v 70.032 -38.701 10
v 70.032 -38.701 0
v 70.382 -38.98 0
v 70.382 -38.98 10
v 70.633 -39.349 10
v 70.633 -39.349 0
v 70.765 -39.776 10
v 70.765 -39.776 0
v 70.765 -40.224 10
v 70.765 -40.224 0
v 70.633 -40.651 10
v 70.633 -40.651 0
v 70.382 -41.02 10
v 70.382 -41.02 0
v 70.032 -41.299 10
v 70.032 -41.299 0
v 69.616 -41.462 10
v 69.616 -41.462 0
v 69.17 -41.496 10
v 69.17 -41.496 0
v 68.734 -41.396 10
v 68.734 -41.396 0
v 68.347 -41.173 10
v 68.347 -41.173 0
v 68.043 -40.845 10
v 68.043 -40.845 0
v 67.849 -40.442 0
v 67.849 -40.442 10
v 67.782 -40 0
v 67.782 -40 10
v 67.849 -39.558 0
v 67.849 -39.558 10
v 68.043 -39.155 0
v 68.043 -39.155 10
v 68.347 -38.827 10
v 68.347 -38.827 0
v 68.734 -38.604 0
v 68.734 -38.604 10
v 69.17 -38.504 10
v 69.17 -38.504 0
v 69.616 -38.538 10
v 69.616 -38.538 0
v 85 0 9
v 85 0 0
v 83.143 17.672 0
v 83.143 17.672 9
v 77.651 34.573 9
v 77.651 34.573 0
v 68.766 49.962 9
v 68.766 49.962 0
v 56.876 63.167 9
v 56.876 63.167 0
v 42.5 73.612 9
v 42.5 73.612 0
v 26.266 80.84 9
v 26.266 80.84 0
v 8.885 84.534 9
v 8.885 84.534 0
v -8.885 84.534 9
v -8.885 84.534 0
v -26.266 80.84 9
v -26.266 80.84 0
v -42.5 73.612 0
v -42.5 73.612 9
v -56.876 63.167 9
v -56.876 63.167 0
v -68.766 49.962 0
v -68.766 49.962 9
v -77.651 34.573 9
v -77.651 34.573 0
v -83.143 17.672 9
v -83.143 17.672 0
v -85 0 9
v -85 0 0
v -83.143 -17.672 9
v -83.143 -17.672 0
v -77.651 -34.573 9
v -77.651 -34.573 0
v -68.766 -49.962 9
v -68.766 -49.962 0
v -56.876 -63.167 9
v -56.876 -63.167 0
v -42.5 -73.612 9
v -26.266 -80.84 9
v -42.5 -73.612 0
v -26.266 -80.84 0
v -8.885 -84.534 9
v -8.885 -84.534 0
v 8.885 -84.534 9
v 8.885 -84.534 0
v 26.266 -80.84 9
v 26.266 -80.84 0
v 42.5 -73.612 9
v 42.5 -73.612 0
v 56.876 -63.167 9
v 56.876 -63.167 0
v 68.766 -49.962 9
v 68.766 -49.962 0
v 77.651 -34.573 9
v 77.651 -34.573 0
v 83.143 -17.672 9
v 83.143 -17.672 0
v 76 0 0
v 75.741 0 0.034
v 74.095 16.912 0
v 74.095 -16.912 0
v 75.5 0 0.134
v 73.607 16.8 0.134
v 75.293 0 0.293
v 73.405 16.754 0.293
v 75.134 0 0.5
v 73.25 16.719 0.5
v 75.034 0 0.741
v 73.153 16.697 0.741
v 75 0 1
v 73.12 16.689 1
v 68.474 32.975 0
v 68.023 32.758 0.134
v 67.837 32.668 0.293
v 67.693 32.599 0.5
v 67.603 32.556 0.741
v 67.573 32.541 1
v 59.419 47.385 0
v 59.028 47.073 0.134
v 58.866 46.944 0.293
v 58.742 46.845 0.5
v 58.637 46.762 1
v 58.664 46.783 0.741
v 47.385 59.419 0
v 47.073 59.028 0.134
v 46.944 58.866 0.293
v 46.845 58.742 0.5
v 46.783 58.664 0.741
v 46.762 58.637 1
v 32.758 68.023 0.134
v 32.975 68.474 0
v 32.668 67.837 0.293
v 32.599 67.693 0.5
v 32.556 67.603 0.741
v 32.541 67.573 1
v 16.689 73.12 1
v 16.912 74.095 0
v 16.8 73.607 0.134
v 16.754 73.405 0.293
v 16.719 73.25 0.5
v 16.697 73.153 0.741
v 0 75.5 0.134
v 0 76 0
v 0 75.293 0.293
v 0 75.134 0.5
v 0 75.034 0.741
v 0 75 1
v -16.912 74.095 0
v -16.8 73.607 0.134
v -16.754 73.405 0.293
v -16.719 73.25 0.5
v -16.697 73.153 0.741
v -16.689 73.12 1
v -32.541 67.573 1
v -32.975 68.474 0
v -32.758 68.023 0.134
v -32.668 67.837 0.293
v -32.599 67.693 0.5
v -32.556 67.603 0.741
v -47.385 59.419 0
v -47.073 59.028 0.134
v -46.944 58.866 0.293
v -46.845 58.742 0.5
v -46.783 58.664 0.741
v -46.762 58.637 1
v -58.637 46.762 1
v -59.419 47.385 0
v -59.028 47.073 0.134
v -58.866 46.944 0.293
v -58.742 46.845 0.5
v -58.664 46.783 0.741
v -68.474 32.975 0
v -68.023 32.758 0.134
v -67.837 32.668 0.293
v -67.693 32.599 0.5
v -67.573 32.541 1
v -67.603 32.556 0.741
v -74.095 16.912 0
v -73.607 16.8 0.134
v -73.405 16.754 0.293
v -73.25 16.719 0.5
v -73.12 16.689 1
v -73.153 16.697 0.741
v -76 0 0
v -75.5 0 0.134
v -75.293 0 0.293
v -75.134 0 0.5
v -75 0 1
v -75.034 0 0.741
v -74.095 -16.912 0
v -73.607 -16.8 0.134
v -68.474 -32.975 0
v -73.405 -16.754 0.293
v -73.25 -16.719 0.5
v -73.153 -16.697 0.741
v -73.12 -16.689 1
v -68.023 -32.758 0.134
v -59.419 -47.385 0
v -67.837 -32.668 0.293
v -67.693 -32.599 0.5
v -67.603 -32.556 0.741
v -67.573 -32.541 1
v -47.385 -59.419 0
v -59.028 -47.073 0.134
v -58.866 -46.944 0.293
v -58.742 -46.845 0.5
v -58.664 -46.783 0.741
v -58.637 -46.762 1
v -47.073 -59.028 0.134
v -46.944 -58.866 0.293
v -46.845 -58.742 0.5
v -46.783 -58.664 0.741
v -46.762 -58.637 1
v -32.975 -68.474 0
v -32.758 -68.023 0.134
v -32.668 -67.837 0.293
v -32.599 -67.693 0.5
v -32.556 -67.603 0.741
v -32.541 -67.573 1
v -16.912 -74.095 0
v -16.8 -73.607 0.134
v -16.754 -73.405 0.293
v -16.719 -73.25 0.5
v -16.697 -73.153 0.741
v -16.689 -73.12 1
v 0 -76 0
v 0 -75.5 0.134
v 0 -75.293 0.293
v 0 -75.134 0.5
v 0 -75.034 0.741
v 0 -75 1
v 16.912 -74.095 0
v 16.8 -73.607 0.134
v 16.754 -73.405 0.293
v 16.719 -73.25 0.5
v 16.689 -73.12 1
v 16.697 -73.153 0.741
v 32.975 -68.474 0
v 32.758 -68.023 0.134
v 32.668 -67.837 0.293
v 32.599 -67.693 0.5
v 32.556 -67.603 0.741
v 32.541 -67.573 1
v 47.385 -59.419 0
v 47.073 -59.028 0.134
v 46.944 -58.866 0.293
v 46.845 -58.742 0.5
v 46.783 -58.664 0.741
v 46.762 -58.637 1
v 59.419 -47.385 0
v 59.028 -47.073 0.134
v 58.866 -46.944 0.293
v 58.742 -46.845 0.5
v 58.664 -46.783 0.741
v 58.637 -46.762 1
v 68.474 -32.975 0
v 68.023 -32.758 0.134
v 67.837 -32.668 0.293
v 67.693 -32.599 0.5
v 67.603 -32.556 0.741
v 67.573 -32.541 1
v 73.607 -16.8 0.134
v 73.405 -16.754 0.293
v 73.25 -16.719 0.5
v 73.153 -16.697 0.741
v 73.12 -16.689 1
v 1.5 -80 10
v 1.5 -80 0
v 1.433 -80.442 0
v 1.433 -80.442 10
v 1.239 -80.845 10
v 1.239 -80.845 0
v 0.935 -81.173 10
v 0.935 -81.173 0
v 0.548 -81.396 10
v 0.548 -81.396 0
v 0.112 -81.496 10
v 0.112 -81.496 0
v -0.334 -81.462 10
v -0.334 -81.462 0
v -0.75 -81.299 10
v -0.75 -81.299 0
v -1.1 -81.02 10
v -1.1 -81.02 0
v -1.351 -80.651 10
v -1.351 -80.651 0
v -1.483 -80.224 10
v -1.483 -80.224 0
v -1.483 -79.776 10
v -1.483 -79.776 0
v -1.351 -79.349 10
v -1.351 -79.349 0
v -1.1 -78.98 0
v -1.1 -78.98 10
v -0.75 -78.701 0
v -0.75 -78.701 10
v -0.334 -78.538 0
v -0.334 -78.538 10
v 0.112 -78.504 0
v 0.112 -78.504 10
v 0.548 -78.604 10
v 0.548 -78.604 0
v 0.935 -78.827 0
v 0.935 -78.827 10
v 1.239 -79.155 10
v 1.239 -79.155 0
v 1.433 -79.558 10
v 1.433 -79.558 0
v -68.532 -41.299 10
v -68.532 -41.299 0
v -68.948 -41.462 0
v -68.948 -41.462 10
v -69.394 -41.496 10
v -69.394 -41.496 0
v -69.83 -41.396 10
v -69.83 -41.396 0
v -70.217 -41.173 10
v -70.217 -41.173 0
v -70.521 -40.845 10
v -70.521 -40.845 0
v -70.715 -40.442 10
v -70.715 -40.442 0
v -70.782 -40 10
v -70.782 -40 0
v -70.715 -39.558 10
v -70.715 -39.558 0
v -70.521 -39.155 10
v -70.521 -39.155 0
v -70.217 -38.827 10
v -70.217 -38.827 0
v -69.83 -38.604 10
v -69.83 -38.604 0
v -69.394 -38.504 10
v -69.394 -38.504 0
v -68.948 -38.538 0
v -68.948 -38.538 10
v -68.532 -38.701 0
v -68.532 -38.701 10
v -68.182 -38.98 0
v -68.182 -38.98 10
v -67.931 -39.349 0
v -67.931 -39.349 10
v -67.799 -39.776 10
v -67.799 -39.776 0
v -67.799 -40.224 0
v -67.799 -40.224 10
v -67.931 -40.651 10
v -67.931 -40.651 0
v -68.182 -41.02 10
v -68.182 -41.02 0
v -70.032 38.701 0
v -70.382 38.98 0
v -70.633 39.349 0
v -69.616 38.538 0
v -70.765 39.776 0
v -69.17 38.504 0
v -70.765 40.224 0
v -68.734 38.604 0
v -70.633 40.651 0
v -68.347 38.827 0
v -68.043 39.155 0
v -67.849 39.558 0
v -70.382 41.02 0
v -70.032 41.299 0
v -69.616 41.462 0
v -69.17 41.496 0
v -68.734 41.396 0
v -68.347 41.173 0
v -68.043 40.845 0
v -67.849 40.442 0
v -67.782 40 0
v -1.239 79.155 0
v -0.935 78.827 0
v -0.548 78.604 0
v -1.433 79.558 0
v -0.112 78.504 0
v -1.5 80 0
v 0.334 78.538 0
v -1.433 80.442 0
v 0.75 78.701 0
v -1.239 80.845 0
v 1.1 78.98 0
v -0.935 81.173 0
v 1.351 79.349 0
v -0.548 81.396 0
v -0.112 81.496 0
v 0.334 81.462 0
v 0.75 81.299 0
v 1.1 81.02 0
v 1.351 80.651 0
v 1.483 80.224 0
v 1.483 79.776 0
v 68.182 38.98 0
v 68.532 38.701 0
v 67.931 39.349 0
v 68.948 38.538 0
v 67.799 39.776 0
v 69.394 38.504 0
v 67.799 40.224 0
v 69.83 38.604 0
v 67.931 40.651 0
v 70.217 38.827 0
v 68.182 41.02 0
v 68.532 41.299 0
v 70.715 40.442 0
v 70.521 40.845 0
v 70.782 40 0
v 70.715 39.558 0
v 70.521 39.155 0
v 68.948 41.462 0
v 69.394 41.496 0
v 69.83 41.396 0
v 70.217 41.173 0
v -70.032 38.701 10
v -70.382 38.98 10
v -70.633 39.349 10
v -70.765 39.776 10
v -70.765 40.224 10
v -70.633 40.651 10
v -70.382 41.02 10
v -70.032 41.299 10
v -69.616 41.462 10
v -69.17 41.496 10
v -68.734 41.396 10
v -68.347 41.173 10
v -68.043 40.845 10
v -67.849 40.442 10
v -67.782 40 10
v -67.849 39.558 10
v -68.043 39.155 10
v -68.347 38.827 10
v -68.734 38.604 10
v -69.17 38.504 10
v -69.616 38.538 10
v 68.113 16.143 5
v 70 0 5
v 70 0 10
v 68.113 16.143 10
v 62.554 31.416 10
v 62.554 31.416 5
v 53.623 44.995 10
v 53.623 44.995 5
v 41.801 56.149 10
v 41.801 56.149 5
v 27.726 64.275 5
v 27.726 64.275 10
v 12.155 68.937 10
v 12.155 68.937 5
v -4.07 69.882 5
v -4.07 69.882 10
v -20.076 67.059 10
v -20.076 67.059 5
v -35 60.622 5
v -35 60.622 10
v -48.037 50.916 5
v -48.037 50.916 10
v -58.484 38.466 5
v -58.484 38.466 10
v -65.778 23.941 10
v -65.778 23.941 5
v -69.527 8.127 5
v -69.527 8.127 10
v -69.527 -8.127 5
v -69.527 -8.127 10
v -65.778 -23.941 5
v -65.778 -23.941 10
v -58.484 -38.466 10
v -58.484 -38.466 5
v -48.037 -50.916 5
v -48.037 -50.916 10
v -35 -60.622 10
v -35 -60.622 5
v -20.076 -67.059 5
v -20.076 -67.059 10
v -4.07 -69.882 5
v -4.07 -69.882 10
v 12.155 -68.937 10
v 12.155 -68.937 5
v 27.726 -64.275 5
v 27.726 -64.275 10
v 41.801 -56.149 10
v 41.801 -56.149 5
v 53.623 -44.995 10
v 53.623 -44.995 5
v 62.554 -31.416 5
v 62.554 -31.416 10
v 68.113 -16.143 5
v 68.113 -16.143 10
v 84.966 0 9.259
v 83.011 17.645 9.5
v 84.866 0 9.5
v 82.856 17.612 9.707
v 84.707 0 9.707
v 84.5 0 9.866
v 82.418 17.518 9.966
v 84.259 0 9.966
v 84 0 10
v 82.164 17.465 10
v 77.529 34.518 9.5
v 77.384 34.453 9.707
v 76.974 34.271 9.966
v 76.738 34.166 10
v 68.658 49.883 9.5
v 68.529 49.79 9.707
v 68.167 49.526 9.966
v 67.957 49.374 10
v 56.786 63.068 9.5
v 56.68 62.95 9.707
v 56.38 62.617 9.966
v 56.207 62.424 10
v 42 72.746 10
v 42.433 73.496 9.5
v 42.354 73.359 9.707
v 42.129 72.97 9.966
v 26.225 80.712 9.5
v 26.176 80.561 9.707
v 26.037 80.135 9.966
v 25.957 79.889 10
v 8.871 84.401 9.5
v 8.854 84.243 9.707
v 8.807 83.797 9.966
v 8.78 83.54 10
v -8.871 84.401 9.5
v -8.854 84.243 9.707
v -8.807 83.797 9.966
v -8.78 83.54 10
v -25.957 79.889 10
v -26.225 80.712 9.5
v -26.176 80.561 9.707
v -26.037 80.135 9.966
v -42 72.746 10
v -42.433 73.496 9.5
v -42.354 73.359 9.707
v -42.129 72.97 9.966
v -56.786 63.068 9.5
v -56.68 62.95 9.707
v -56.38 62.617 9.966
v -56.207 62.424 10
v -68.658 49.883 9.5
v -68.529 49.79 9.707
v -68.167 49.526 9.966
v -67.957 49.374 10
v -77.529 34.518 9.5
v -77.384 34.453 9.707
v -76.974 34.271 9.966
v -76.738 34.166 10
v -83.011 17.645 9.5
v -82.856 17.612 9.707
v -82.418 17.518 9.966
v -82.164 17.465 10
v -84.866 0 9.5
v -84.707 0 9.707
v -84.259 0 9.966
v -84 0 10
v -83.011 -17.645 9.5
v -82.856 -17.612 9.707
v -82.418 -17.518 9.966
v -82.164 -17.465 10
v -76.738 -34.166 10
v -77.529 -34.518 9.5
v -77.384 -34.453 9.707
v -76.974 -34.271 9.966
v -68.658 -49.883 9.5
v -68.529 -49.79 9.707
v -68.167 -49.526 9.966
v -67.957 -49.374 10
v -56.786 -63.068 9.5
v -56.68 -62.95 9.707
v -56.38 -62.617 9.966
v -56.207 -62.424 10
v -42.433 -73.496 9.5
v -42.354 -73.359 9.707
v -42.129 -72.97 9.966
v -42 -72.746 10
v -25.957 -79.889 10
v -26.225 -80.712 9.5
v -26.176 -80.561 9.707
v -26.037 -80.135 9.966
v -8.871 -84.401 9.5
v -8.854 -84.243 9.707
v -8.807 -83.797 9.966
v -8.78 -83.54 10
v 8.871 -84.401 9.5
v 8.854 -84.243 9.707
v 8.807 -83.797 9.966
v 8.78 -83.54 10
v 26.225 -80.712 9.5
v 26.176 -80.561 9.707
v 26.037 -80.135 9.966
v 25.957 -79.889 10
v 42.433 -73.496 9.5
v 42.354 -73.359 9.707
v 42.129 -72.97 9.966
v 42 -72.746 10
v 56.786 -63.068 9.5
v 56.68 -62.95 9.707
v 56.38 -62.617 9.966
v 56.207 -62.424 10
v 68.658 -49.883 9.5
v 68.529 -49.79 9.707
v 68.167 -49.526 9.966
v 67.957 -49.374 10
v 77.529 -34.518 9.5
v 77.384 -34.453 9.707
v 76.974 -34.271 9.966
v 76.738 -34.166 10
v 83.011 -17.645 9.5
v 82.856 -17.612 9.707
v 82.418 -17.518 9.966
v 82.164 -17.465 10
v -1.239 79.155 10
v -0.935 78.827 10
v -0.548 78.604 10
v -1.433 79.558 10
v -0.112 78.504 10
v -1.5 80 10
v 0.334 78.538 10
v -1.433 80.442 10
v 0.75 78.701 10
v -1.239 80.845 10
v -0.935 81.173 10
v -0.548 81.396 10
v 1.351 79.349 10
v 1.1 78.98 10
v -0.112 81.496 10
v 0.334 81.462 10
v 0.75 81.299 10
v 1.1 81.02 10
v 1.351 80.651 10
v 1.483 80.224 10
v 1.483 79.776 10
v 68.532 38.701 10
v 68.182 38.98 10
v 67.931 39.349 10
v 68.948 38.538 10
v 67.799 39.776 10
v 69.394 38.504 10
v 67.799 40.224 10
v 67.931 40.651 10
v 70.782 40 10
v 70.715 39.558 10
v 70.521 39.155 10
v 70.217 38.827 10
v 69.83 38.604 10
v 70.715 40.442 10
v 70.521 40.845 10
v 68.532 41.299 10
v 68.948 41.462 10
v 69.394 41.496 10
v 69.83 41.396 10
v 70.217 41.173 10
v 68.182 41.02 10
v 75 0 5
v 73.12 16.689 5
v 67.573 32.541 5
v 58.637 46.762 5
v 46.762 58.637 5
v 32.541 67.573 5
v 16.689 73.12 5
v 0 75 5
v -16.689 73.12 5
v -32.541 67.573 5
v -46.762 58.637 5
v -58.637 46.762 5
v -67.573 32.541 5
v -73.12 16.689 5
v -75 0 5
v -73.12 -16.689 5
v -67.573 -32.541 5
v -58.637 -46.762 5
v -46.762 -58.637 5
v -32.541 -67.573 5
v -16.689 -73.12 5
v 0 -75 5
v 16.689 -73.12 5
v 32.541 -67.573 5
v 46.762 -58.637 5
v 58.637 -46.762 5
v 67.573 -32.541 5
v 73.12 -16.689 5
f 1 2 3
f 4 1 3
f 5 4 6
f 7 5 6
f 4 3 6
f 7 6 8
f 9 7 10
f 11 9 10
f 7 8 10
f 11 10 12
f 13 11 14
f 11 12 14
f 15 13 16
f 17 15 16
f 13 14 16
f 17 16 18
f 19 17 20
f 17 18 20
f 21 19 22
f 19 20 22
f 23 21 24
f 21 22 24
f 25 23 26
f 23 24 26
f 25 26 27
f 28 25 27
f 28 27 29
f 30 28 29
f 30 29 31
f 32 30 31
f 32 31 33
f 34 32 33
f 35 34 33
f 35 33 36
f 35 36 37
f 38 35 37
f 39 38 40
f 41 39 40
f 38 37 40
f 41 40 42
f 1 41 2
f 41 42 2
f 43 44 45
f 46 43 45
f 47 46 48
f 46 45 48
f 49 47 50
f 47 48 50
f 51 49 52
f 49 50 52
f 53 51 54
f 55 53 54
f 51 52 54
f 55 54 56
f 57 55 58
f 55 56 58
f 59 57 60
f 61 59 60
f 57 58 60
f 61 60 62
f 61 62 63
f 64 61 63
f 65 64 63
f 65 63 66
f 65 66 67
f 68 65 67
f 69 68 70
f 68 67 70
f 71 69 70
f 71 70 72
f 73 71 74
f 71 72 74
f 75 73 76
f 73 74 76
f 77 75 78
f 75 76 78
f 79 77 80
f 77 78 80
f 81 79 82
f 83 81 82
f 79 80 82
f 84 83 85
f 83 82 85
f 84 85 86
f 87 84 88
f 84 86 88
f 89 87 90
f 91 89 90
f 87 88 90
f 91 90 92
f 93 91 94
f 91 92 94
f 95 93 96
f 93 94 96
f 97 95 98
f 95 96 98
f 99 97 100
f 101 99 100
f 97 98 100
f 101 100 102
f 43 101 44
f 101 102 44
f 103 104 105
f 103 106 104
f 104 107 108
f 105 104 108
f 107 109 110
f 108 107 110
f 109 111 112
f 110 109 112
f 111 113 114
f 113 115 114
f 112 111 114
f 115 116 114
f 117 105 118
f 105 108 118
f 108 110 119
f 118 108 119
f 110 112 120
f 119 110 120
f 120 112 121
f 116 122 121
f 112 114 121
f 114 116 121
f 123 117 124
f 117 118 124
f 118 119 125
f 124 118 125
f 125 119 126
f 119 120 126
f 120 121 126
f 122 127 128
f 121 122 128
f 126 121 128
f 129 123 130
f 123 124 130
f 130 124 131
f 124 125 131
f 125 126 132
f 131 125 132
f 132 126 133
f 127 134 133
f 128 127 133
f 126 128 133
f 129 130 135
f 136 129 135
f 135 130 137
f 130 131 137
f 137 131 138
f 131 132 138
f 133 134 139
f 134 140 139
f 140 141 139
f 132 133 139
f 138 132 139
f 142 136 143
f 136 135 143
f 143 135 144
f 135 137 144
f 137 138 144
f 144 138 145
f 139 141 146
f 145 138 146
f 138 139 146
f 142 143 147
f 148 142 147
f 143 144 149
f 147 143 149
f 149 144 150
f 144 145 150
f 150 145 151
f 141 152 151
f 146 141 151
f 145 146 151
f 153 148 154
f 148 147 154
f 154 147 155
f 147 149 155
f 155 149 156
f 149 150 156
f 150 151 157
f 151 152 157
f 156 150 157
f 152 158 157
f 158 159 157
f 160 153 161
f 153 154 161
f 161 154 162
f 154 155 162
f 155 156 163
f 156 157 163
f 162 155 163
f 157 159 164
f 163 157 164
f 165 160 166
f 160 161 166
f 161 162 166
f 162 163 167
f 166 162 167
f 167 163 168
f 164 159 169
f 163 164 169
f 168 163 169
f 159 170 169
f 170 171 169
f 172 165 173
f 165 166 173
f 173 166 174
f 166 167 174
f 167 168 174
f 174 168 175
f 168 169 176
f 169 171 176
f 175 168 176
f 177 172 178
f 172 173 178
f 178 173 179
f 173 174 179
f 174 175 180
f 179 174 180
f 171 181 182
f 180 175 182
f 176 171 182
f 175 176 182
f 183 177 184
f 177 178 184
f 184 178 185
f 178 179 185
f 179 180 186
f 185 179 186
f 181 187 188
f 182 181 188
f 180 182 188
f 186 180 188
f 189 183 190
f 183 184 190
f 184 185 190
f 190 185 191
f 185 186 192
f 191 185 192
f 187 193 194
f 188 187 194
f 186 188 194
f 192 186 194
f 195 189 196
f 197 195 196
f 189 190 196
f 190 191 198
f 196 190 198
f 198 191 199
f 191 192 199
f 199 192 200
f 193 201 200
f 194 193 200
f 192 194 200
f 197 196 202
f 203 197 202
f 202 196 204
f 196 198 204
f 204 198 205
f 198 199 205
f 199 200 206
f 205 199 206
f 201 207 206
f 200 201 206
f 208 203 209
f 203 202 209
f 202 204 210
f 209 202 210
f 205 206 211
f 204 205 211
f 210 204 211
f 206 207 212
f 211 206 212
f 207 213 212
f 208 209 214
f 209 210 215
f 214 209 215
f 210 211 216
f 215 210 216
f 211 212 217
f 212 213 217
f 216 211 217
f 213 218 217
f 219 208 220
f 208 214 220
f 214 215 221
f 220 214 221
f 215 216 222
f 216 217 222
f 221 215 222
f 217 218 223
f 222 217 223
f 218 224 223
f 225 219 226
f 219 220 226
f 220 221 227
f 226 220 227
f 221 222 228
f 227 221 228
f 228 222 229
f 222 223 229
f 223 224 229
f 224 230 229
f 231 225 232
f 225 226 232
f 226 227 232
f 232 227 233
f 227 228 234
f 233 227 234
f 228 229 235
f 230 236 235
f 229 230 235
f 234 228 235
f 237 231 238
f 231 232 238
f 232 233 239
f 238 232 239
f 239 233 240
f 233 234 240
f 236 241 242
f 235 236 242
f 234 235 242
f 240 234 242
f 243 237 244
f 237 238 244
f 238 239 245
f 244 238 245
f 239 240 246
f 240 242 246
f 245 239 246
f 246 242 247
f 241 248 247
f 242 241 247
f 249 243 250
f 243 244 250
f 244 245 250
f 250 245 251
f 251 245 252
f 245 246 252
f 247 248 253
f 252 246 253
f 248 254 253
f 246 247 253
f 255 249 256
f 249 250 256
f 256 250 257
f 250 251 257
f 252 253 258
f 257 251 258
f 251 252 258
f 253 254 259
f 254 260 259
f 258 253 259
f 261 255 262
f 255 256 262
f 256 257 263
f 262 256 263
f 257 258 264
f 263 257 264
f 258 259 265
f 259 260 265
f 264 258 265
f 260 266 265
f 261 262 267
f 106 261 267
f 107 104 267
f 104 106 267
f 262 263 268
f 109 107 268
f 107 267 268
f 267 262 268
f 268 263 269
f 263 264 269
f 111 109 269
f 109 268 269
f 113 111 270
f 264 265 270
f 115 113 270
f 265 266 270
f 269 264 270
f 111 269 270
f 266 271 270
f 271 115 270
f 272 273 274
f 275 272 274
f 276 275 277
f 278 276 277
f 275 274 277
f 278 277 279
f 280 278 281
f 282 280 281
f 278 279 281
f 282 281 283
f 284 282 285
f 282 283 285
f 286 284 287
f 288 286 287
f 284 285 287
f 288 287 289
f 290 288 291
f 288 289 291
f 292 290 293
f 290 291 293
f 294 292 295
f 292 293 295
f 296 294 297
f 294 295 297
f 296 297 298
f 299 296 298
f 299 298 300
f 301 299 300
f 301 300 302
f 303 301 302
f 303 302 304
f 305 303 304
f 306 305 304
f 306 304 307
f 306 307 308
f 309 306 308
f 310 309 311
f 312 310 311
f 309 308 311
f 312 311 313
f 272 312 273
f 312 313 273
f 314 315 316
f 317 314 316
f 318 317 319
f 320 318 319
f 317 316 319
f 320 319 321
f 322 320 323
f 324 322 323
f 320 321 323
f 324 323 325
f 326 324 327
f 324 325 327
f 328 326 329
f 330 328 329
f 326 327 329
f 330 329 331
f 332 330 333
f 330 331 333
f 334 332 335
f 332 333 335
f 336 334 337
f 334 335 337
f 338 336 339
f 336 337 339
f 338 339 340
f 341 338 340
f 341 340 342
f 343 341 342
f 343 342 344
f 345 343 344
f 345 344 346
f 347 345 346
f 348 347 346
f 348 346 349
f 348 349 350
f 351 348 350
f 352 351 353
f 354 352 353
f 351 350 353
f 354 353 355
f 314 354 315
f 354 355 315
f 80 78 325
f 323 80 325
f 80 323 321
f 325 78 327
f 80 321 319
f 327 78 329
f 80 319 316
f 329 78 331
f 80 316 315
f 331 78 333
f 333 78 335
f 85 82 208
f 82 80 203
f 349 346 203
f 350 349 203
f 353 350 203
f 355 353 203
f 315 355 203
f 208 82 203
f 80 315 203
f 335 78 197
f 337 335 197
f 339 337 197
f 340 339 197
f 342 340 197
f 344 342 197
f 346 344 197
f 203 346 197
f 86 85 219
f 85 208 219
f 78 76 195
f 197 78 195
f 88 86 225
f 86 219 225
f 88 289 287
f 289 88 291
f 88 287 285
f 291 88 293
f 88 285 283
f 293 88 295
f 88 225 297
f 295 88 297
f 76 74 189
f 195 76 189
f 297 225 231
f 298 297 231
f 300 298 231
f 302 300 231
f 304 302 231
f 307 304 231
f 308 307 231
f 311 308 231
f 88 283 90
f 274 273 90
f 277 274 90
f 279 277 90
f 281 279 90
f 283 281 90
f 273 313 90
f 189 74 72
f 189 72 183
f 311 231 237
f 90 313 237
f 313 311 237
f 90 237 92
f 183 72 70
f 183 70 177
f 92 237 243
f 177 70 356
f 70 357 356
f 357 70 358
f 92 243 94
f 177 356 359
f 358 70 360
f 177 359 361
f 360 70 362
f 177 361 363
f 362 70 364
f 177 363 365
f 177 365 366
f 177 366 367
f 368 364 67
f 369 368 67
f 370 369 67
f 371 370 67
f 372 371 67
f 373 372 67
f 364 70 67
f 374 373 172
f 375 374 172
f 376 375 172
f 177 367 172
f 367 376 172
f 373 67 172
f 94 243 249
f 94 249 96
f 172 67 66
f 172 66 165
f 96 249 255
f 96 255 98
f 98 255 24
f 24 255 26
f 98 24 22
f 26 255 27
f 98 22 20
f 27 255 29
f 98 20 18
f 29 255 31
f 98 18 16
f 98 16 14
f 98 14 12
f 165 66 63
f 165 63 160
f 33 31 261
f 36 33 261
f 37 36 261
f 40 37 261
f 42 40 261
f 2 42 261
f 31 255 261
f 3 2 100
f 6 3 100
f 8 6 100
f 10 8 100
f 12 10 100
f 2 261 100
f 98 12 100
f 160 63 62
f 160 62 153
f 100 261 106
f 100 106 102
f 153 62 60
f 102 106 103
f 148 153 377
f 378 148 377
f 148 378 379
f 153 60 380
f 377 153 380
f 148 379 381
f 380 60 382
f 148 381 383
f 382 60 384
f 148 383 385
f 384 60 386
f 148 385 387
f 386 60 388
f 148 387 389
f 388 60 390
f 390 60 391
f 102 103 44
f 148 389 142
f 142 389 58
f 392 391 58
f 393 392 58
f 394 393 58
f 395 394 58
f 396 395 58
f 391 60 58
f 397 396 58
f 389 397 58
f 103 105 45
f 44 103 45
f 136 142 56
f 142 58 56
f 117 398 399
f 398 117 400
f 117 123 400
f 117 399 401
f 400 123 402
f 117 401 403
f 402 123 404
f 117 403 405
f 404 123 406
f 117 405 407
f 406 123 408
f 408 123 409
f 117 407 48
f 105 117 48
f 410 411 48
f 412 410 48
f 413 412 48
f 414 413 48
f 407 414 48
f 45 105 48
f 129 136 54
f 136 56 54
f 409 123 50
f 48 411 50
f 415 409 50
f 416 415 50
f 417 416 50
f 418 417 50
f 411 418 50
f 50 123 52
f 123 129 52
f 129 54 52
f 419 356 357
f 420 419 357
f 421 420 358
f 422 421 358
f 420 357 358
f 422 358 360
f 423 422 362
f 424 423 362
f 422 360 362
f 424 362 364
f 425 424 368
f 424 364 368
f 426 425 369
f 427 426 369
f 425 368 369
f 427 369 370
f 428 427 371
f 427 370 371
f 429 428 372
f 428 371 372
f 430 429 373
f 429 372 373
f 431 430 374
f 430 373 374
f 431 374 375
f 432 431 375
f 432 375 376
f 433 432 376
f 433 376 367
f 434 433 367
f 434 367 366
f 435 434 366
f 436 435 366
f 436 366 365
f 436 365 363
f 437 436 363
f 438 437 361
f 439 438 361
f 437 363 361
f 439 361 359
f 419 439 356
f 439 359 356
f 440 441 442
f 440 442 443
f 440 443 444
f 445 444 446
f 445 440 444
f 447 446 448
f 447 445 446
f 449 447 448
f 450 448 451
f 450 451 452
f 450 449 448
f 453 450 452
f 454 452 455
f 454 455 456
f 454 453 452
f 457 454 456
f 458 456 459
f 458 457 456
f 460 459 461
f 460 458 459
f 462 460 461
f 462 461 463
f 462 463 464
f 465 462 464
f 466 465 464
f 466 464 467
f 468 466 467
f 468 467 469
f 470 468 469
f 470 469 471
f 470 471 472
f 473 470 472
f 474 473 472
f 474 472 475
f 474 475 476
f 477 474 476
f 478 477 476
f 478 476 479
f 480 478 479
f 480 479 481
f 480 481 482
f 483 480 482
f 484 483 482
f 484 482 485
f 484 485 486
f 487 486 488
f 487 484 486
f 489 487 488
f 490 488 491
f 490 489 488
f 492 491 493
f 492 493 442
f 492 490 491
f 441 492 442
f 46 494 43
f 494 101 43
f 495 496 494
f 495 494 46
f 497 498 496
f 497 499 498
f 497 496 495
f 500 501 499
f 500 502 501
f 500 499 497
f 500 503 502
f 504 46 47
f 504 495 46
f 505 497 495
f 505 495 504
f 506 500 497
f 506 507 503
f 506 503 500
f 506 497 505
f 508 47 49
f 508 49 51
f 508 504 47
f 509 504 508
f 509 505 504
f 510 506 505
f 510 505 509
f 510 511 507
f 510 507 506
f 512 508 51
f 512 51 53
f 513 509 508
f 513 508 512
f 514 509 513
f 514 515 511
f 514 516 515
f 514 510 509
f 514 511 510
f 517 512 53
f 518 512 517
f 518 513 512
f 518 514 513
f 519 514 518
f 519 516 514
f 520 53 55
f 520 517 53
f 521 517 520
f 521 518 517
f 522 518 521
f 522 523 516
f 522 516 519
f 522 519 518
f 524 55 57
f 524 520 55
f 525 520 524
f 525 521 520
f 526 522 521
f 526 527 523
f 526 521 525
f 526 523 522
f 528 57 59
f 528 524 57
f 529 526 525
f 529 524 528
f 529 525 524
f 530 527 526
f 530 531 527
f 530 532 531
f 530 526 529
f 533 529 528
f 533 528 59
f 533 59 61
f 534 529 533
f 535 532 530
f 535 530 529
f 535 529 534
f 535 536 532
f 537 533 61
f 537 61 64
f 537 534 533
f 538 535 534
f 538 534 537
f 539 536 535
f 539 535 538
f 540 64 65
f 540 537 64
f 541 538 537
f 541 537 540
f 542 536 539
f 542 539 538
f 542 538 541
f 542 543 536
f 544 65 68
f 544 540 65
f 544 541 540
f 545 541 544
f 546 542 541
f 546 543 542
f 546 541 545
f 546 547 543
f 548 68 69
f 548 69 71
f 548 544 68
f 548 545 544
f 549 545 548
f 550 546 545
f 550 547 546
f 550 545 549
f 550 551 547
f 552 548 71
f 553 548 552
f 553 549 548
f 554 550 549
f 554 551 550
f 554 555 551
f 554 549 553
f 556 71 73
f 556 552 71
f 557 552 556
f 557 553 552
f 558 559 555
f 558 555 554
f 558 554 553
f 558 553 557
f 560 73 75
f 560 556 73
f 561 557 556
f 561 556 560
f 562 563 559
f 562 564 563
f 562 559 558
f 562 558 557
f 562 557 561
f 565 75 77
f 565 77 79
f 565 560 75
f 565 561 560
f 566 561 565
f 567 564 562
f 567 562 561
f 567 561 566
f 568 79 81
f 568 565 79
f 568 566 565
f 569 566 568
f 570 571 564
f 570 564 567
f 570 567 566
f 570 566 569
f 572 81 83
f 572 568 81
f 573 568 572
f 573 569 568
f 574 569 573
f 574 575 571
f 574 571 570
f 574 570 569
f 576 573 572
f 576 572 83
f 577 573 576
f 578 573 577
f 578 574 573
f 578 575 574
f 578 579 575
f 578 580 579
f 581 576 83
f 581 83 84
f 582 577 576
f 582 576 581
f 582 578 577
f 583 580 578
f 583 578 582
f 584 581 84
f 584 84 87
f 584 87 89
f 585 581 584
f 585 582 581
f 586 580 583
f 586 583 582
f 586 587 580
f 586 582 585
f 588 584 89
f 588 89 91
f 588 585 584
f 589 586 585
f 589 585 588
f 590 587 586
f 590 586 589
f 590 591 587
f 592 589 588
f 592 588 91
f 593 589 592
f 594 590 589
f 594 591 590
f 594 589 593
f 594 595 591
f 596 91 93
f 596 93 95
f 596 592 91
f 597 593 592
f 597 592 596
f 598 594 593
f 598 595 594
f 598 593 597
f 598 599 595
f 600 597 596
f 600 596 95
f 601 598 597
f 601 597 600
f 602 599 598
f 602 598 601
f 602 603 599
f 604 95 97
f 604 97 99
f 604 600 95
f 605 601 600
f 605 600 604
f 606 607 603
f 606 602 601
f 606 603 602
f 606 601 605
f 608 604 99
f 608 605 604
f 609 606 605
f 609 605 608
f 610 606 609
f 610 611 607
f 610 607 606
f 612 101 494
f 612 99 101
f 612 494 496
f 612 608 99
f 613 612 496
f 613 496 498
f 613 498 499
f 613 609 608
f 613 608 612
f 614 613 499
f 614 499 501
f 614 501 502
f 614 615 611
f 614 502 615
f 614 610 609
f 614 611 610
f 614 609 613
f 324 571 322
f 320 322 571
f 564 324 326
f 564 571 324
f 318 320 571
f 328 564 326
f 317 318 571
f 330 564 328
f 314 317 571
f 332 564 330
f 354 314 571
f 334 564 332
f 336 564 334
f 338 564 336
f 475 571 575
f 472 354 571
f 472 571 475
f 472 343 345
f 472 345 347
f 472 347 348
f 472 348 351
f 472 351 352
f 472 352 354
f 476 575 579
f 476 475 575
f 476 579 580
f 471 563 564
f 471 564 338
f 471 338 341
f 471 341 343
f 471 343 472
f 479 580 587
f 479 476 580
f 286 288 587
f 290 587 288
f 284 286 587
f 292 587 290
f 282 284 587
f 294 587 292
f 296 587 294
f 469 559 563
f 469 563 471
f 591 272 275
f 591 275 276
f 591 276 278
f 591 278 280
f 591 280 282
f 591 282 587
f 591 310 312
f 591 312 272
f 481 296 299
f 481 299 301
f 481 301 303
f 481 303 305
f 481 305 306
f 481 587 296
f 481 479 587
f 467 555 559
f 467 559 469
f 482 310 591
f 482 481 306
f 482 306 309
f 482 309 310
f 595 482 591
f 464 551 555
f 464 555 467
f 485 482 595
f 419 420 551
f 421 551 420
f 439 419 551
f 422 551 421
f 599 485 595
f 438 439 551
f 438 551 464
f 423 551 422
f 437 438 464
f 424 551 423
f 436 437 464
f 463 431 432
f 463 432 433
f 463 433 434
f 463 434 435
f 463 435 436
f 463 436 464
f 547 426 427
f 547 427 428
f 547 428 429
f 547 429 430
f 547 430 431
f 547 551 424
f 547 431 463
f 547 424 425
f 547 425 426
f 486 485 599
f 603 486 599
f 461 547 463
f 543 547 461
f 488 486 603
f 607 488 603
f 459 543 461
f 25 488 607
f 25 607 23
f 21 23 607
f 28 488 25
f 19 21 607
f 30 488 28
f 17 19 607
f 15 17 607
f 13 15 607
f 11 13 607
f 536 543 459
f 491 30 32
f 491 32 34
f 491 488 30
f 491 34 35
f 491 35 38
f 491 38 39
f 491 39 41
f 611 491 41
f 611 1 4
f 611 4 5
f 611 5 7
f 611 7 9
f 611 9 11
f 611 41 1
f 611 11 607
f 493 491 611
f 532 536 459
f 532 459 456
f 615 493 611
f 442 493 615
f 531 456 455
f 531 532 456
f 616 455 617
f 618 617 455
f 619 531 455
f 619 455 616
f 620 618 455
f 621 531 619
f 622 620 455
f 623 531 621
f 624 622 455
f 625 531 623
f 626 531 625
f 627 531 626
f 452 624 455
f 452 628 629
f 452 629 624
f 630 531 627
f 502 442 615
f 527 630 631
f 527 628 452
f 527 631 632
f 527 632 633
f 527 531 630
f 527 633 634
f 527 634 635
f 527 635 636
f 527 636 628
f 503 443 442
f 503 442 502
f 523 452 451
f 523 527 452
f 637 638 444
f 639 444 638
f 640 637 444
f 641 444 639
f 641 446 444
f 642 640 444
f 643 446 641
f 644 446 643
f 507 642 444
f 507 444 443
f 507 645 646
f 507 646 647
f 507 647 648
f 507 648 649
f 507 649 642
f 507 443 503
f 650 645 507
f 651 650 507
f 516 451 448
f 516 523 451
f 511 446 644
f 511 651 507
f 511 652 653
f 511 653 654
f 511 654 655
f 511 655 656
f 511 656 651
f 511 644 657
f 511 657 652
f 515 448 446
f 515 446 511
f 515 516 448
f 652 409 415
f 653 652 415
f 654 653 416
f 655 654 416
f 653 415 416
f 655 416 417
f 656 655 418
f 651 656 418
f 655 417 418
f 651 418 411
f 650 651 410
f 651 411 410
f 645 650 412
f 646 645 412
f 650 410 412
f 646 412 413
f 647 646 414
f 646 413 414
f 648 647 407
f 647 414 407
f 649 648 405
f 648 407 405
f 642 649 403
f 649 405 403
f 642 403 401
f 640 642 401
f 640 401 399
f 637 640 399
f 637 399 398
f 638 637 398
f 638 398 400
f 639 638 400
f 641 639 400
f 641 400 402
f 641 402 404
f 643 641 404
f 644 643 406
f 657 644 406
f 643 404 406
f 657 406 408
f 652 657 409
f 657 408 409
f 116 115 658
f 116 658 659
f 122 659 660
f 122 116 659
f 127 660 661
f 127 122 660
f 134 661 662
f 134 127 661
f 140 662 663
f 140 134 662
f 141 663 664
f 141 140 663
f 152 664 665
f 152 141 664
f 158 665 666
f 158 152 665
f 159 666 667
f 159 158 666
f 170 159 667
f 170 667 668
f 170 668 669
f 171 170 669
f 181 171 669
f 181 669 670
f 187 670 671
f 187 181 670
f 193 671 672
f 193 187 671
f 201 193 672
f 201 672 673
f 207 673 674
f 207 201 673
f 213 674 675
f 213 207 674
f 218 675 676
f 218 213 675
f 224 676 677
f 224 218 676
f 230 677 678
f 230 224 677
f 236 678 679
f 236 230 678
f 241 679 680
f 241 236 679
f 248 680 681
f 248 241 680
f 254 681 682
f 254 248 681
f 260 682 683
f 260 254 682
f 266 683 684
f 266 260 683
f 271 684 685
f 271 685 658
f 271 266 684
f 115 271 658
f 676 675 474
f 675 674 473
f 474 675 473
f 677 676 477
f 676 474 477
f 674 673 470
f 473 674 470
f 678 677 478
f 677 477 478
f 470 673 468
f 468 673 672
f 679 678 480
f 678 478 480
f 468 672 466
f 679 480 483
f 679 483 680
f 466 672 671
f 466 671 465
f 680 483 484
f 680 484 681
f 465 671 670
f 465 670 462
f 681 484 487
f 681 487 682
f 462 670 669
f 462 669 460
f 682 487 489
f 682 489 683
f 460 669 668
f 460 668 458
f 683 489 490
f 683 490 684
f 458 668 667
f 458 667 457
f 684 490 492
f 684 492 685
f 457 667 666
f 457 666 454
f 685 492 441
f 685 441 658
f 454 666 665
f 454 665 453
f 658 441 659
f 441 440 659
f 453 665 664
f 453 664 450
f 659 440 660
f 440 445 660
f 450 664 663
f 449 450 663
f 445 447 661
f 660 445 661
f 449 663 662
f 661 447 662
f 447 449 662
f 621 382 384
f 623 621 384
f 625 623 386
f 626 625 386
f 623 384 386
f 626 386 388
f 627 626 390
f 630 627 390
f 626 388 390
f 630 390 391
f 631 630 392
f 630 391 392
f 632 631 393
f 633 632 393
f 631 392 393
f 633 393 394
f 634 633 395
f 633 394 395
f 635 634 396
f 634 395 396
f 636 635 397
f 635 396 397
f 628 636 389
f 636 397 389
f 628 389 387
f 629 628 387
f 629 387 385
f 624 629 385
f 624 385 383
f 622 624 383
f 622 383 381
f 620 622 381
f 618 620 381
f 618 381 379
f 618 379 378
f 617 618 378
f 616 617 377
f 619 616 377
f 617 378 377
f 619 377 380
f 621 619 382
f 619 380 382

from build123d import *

# Parameters (mm, degrees)
SKETCH1_R           = 85
SKETCH1_R_2         = 70
BOSS_EXTRUDE1_DEPTH = 10
SKETCH2_R           = 75
CUT_EXTRUDE2_DEPTH  = 5
SKETCH3_R           = 1.5
CUT_EXTRUDE3_DEPTH  = 10
CIRPATTERN1_COUNT   = 6
FILLET1_R           = 1


with BuildPart() as part:
    # Sketch1 → Boss-Extrude1 (new body)
    with BuildSketch(Plane.XY):
        Circle(SKETCH1_R)
        Circle(SKETCH1_R_2, mode=Mode.SUBTRACT)
    extrude(amount=BOSS_EXTRUDE1_DEPTH)

    # Sketch2 → Cut-Extrude2 (cut)
    with BuildSketch(Plane.XY):
        Circle(SKETCH2_R)
    extrude(amount=CUT_EXTRUDE2_DEPTH, mode=Mode.SUBTRACT)

    # Sketch3 → Cut-Extrude3 (cut)
    with BuildSketch(Plane(origin=(0, 0, 0), x_dir=(-1, 0, 0), z_dir=(0, 0, -1))):
        with Locations((0, 80)):
            Circle(SKETCH3_R)
    cut_extrude3 = extrude(amount=-CUT_EXTRUDE3_DEPTH, mode=Mode.SUBTRACT)

    # CirPattern1: Cut-Extrude3 ×6 about axis
    cirpattern1_axis = Axis((0, 0, 0), (0, 0, 1))
    for i in range(1, CIRPATTERN1_COUNT):
        add(cut_extrude3.rotate(cirpattern1_axis, i * 360 / CIRPATTERN1_COUNT), mode=Mode.SUBTRACT)

    # Fillet1
    fillet1_edges = [part.edges().sort_by_distance(p)[0] for p in [
        (-75, 0, 0),
        (-85, 0, 10),
    ]]
    fillet(fillet1_edges, radius=FILLET1_R)


solid = part.part
